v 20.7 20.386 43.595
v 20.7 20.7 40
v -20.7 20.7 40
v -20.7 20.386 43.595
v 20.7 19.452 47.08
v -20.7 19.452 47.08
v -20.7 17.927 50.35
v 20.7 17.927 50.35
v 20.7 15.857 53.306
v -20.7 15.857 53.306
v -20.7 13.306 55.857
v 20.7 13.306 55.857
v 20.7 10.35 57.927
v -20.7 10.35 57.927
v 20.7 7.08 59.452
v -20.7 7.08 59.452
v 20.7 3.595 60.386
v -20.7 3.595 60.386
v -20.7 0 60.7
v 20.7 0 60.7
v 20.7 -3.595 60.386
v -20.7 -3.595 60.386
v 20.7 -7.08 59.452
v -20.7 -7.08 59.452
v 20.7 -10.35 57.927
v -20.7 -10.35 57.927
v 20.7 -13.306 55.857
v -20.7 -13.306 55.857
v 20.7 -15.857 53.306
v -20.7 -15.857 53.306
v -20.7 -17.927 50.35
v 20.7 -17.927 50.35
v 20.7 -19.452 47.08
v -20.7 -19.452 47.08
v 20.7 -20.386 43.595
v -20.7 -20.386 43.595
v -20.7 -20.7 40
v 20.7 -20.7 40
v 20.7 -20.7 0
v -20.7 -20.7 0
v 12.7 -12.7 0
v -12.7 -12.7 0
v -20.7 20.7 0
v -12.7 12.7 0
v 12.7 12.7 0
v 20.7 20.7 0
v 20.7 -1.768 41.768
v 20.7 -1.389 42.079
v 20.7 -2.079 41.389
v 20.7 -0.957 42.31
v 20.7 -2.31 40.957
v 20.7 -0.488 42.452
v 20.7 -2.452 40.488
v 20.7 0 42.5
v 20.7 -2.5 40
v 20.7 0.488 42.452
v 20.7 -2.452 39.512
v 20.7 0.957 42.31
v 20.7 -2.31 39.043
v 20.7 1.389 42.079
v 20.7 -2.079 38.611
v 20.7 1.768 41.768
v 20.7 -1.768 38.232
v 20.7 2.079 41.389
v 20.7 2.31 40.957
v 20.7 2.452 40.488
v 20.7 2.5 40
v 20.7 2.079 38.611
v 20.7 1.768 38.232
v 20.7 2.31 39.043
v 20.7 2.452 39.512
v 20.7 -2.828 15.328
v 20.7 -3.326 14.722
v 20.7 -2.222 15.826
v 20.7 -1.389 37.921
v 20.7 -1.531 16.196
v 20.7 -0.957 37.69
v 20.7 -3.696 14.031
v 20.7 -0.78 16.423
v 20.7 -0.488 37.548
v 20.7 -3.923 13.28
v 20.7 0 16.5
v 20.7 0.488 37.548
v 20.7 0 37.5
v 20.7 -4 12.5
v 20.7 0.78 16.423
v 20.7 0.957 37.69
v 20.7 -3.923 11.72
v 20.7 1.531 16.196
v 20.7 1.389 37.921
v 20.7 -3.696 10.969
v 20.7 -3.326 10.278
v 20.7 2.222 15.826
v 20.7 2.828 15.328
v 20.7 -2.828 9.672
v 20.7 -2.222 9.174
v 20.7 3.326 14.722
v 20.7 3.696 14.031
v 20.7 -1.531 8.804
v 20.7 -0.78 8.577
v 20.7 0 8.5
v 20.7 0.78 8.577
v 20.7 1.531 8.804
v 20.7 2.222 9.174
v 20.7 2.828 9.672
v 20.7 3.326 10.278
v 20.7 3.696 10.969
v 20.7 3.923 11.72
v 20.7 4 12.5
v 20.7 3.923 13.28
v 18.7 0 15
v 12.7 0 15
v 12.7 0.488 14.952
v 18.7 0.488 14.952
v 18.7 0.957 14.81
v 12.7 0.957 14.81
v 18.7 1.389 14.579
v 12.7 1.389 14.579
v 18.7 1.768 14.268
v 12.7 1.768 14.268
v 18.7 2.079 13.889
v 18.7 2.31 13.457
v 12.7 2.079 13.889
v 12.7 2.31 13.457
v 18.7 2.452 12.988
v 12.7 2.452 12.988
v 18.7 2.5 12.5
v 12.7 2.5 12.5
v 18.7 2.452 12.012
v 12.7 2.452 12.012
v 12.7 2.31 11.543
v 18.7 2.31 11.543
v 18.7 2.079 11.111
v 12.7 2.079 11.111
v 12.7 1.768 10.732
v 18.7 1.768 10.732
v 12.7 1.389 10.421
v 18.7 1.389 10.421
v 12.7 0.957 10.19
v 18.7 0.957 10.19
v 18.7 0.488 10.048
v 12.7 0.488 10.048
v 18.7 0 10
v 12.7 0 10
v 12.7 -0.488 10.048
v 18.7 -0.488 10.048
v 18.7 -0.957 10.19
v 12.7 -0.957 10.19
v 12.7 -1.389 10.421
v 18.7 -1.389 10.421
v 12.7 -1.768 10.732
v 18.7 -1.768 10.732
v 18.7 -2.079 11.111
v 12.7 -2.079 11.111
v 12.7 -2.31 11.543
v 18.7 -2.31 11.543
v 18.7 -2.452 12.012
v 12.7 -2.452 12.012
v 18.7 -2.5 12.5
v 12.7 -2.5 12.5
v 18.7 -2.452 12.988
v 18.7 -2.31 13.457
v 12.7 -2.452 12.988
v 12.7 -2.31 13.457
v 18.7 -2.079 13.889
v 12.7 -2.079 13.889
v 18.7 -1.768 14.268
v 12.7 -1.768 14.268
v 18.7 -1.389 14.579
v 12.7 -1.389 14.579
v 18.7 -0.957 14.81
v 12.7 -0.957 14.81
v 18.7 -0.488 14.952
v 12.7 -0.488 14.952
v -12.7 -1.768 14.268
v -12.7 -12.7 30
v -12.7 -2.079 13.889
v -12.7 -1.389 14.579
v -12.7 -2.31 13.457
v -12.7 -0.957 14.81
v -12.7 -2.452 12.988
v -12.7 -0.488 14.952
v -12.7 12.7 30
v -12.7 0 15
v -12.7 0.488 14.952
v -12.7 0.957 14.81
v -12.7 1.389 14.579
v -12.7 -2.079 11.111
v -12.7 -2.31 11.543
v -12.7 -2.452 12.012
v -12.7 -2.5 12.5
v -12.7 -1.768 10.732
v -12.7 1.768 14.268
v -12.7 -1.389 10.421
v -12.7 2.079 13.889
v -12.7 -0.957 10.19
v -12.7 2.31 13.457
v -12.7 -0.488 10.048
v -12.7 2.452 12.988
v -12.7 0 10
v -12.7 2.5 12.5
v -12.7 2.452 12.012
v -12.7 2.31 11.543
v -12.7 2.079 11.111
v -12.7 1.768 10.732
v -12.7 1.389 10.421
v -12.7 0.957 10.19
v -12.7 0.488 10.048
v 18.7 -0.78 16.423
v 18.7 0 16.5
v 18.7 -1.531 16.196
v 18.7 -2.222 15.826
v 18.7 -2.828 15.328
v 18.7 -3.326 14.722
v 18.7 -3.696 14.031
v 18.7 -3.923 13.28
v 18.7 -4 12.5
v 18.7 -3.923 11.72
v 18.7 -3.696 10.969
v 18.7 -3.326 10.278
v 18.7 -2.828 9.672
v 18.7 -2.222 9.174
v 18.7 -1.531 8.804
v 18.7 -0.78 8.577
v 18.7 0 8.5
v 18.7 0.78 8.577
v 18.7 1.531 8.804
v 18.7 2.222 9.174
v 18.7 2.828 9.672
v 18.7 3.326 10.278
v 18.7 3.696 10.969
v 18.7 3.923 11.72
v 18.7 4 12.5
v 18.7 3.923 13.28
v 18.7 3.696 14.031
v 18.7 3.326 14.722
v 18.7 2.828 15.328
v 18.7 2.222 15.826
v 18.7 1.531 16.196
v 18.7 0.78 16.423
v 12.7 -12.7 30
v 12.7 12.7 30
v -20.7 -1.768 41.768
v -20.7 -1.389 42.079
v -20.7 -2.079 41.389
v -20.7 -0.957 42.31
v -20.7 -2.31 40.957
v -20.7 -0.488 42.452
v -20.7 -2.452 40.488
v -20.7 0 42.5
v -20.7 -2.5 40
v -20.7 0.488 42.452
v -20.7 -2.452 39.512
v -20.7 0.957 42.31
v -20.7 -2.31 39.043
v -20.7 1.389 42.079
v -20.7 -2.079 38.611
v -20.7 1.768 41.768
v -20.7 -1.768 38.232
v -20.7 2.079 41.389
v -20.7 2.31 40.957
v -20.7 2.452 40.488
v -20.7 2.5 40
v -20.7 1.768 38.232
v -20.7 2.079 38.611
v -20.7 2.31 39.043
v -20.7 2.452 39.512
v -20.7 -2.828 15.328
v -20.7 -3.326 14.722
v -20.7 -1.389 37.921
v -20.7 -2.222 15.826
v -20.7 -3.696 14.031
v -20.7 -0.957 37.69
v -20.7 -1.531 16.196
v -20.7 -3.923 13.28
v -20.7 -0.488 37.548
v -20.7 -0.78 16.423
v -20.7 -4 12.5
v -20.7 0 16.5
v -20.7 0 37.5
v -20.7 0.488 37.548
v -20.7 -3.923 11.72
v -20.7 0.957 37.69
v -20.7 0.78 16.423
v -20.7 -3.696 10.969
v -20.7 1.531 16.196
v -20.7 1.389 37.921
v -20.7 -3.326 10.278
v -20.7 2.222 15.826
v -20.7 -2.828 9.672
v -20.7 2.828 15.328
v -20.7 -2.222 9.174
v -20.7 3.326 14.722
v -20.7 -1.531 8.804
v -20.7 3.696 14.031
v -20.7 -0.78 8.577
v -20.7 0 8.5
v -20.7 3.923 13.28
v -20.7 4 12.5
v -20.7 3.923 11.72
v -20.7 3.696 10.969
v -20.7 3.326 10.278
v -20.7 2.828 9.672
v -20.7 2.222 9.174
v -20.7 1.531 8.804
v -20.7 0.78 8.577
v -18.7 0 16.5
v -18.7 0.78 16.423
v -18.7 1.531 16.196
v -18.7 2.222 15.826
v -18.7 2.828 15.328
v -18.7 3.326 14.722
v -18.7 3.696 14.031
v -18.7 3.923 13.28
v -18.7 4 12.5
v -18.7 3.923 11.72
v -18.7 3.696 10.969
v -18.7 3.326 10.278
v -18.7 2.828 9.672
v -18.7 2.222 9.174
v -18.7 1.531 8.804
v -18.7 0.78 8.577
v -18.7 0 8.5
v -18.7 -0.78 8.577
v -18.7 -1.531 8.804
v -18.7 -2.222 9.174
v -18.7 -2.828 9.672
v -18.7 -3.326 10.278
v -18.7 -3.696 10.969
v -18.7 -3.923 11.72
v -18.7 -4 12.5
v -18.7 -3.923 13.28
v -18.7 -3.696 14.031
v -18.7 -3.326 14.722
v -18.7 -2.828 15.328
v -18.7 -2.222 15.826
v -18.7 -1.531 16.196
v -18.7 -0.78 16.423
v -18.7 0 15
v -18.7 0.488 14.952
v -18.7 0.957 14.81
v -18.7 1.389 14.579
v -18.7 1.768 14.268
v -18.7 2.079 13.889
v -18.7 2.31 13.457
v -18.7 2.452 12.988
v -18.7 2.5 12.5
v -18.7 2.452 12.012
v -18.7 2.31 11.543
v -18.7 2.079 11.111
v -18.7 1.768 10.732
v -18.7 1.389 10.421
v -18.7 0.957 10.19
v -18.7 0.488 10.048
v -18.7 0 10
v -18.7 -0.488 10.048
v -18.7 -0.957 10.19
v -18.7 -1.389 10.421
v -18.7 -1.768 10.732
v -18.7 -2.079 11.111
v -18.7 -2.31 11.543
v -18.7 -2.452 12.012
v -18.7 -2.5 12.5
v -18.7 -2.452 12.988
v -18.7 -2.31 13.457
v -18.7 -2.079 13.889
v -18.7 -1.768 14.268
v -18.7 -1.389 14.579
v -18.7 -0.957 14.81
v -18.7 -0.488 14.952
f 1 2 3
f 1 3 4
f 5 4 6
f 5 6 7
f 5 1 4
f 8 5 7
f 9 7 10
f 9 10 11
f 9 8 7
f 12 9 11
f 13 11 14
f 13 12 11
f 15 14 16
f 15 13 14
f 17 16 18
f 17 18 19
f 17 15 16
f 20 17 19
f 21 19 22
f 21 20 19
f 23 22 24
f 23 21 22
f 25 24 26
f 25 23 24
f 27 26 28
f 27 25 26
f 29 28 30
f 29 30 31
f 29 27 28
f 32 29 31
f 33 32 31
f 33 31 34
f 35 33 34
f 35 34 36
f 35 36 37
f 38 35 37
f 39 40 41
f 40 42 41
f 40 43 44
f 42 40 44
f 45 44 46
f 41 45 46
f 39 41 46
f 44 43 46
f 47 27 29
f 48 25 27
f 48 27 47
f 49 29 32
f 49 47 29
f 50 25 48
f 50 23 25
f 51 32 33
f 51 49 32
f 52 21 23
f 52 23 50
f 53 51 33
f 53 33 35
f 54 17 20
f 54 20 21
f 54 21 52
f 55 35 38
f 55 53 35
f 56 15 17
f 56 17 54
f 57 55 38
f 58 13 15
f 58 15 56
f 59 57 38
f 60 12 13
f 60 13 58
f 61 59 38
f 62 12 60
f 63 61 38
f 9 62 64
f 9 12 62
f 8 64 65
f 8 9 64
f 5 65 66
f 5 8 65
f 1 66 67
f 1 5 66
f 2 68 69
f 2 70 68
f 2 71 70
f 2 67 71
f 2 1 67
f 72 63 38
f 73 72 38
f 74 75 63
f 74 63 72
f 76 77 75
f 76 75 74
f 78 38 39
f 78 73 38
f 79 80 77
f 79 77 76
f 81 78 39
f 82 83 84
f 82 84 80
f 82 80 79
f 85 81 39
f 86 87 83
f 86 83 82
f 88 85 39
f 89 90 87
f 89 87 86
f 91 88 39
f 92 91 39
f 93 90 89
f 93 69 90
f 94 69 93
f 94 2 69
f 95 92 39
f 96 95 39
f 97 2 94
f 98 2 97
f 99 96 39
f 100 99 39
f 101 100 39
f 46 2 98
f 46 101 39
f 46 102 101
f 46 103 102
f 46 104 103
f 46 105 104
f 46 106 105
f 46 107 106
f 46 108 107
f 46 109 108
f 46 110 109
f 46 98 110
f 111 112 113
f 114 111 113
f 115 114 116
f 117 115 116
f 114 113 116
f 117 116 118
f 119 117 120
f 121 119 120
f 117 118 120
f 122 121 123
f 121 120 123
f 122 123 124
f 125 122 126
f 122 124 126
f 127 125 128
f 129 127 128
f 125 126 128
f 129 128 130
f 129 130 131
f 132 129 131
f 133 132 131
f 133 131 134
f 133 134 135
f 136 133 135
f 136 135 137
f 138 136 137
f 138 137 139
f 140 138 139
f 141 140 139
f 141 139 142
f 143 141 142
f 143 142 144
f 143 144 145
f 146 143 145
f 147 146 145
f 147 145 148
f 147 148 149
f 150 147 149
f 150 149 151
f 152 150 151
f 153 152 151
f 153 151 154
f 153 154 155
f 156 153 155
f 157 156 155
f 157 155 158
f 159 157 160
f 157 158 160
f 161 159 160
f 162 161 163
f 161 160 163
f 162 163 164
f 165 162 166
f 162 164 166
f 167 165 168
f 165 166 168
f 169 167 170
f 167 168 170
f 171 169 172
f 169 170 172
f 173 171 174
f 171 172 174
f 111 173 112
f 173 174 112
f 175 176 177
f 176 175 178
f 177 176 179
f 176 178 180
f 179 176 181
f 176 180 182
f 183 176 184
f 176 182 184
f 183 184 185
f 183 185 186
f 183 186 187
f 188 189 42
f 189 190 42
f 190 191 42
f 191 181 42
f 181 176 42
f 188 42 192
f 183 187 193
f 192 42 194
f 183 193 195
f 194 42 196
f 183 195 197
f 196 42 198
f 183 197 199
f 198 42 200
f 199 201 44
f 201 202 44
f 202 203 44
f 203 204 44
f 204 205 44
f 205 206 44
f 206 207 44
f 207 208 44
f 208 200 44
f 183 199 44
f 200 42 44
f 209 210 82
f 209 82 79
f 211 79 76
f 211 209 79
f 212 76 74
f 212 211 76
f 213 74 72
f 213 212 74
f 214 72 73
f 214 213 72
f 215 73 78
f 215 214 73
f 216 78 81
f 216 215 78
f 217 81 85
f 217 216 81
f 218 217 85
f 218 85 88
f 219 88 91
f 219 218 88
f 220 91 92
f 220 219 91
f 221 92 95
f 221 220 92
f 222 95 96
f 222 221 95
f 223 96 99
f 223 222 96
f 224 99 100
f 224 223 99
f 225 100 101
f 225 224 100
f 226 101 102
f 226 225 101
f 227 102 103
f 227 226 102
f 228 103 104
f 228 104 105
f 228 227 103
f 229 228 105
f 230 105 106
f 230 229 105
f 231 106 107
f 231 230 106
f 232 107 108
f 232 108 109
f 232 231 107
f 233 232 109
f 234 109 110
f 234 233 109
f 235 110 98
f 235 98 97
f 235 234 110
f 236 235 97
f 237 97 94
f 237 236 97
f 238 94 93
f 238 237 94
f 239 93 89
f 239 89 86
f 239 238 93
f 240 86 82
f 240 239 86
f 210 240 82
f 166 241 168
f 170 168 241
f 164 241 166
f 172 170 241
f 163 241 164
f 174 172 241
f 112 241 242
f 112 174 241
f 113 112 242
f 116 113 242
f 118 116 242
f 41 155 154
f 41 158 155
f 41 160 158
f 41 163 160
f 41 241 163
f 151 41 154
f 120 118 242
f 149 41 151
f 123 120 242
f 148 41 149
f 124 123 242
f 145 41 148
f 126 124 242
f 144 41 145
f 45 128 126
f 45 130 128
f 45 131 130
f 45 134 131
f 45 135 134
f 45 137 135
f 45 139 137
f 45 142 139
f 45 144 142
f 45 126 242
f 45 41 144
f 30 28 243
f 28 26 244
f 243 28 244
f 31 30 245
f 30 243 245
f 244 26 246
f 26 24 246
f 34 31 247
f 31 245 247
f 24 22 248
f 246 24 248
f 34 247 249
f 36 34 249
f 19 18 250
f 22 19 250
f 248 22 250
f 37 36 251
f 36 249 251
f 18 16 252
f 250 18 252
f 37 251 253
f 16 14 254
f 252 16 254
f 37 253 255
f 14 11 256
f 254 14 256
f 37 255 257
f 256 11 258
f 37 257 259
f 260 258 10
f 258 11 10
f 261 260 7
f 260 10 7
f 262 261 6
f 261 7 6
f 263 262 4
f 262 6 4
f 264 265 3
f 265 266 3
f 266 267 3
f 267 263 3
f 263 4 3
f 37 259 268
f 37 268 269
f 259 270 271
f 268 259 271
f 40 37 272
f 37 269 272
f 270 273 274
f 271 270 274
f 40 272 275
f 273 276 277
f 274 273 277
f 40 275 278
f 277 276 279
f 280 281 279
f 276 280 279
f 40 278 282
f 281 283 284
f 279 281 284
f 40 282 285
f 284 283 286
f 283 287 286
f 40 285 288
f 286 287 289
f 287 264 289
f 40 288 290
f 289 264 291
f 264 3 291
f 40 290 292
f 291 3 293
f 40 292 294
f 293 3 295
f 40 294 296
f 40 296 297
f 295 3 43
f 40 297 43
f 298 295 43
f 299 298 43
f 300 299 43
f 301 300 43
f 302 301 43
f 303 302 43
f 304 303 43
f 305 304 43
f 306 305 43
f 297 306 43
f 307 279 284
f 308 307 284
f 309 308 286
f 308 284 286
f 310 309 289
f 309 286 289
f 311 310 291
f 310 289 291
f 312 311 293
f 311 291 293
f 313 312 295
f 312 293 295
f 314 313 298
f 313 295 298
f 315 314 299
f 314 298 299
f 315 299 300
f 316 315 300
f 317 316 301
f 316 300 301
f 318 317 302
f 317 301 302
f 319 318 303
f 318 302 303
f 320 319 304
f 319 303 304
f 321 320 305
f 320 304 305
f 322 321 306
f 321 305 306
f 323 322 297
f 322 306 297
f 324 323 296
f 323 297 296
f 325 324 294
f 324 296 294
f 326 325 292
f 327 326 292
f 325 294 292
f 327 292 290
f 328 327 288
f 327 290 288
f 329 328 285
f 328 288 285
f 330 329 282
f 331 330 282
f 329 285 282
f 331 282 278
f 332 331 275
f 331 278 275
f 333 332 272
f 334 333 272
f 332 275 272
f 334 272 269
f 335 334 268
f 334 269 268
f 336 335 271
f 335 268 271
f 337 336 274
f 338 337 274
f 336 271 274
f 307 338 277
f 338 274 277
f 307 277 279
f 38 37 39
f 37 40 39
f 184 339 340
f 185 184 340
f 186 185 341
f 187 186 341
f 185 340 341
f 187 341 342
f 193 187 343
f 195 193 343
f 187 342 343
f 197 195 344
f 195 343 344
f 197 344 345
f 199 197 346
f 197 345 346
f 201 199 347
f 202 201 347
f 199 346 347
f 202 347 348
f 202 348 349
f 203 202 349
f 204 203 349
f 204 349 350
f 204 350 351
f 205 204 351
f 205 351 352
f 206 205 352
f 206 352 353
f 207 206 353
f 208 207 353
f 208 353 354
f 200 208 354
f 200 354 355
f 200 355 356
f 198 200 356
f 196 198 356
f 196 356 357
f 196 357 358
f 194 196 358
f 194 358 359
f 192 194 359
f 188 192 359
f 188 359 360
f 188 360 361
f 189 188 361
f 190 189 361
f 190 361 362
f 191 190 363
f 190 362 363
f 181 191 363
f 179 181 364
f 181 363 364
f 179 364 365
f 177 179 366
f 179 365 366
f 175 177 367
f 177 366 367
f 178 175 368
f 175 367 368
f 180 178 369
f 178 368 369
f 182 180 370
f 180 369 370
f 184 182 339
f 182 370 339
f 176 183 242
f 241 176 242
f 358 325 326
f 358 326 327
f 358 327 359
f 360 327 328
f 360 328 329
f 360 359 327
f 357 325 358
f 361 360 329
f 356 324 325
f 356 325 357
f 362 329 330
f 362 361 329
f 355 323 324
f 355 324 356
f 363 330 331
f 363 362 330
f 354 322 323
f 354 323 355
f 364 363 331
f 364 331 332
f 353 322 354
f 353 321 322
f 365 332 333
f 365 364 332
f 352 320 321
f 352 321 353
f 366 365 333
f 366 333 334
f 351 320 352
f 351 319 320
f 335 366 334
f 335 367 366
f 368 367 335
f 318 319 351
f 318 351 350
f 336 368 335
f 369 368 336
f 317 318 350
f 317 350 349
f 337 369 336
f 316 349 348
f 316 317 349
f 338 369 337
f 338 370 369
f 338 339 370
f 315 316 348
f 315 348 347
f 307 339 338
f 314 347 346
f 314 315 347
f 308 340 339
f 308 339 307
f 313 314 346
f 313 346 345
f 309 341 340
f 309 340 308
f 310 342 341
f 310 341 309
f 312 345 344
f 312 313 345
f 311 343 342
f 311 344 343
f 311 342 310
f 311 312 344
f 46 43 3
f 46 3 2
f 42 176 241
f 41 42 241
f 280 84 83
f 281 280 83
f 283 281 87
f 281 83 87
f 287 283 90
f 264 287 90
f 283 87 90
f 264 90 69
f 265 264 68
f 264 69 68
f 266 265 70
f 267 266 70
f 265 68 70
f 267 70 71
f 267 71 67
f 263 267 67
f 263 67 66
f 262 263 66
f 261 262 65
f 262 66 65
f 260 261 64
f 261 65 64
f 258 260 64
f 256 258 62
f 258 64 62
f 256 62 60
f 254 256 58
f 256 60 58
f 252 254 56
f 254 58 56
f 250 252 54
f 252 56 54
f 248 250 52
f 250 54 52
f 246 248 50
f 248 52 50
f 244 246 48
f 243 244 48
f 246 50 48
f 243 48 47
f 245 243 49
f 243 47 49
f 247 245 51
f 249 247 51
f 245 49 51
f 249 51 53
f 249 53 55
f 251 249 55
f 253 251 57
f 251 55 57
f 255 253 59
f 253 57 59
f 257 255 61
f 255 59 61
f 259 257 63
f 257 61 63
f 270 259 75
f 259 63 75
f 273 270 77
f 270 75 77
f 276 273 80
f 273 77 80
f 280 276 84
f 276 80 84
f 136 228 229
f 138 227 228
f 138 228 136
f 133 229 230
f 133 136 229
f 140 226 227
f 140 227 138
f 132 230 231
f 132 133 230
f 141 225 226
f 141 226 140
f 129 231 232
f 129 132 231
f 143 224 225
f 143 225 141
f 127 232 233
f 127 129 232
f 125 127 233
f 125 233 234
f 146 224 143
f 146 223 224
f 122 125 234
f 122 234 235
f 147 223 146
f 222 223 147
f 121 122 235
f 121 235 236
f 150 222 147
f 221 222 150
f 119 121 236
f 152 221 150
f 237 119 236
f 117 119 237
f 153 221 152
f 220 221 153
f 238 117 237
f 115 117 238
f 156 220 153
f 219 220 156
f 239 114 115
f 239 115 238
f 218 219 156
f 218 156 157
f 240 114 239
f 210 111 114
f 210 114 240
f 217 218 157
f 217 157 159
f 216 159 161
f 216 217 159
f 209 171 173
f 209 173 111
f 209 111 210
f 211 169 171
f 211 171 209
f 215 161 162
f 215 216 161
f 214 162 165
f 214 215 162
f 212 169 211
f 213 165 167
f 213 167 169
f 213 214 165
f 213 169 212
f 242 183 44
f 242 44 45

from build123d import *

# Parameters (mm, degrees)
SKETCH1_W           = 41.4
SKETCH1_H           = 41.4
SKETCH1_W_2         = 25.4
SKETCH1_H_2         = 25.4
BOSS_EXTRUDE1_DEPTH = 30
SKETCH2_W           = 41.4
SKETCH2_H           = 41.4
BOSS_EXTRUDE2_DEPTH = 10
BOSS_EXTRUDE3_DEPTH = 41.4
SKETCH4_R           = 2.5
CUT_EXTRUDE1_DEPTH  = 41.4
CUT_EXTRUDE2_REACH  = 78.334
SKETCH5_R           = 2.5
SKETCH6_R           = 4
CUT_EXTRUDE3_DEPTH  = 2
CUT_EXTRUDE4_START  = -2
SKETCH7_R           = 4
CUT_EXTRUDE4_DEPTH  = 2


with BuildPart() as part:
    # Sketch1 → Boss-Extrude1 (new body)
    with BuildSketch(Plane.XY):
        Rectangle(SKETCH1_W, SKETCH1_H)
        Rectangle(SKETCH1_W_2, SKETCH1_H_2, mode=Mode.SUBTRACT)
    extrude(amount=BOSS_EXTRUDE1_DEPTH)

    # Sketch2 → Boss-Extrude2 (add)
    with BuildSketch(Plane.XY.offset(30)):
        Rectangle(SKETCH2_W, SKETCH2_H)
    extrude(amount=BOSS_EXTRUDE2_DEPTH)

    # Sketch3 → Boss-Extrude3 (add)
    with BuildSketch(Plane(origin=(20.7, 0, 0), x_dir=(0, 0, -1), z_dir=(1, 0, 0))):
        with BuildLine():
            Line((-40, -20.7), (-40, 20.7))
            ThreePointArc((-40, 20.7), (-60.7, 0), (-40, -20.7))
        make_face()
    extrude(amount=-BOSS_EXTRUDE3_DEPTH)

    # Sketch4 → Cut-Extrude1 (cut)
    with BuildSketch(Plane(origin=(20.7, 0, 0), x_dir=(0, 0, -1), z_dir=(1, 0, 0))):
        with Locations((-40, 0)):
            Circle(SKETCH4_R)
    extrude(amount=-CUT_EXTRUDE1_DEPTH, mode=Mode.SUBTRACT)

    # Cut-Extrude2: up to this face of the body (flat: up to its plane)
    cut_extrude2_end = Plane(part.part.faces().sort_by_distance((20.7, 0, 28.219269494))[0])
    # Sketch5 → Cut-Extrude2 (cut, up to the picked face)
    with BuildSketch(Plane.ZY.offset(20.7), mode=Mode.PRIVATE) as cut_extrude2_sk1:
        with Locations((12.5, 0)):
            Circle(SKETCH5_R)
    cut_extrude2_tool1 = split(extrude(cut_extrude2_sk1.sketch, amount=-CUT_EXTRUDE2_REACH, mode=Mode.PRIVATE), bisect_by=cut_extrude2_end, keep=Keep.BOTH, mode=Mode.PRIVATE)
    add(cut_extrude2_tool1.solids().sort_by(Axis((-20.7, 0, 12.5), (1, 0, 0)))[0], mode=Mode.SUBTRACT)

    # Sketch6 → Cut-Extrude3 (cut)
    with BuildSketch(Plane.ZY.offset(20.7)):
        with Locations((12.5, 0)):
            Circle(SKETCH6_R)
    extrude(amount=-CUT_EXTRUDE3_DEPTH, mode=Mode.SUBTRACT)

    # Sketch7 → Cut-Extrude4 (cut)
    with BuildSketch(Plane(origin=(20.7, 0, 0), x_dir=(0, 0, -1), z_dir=(1, 0, 0)).offset(CUT_EXTRUDE4_START)):
        with Locations(Location((-12.5, 0, 0), (0, 0, 180))):
            Circle(SKETCH7_R)
    extrude(amount=CUT_EXTRUDE4_DEPTH, mode=Mode.SUBTRACT)


solid = part.part
